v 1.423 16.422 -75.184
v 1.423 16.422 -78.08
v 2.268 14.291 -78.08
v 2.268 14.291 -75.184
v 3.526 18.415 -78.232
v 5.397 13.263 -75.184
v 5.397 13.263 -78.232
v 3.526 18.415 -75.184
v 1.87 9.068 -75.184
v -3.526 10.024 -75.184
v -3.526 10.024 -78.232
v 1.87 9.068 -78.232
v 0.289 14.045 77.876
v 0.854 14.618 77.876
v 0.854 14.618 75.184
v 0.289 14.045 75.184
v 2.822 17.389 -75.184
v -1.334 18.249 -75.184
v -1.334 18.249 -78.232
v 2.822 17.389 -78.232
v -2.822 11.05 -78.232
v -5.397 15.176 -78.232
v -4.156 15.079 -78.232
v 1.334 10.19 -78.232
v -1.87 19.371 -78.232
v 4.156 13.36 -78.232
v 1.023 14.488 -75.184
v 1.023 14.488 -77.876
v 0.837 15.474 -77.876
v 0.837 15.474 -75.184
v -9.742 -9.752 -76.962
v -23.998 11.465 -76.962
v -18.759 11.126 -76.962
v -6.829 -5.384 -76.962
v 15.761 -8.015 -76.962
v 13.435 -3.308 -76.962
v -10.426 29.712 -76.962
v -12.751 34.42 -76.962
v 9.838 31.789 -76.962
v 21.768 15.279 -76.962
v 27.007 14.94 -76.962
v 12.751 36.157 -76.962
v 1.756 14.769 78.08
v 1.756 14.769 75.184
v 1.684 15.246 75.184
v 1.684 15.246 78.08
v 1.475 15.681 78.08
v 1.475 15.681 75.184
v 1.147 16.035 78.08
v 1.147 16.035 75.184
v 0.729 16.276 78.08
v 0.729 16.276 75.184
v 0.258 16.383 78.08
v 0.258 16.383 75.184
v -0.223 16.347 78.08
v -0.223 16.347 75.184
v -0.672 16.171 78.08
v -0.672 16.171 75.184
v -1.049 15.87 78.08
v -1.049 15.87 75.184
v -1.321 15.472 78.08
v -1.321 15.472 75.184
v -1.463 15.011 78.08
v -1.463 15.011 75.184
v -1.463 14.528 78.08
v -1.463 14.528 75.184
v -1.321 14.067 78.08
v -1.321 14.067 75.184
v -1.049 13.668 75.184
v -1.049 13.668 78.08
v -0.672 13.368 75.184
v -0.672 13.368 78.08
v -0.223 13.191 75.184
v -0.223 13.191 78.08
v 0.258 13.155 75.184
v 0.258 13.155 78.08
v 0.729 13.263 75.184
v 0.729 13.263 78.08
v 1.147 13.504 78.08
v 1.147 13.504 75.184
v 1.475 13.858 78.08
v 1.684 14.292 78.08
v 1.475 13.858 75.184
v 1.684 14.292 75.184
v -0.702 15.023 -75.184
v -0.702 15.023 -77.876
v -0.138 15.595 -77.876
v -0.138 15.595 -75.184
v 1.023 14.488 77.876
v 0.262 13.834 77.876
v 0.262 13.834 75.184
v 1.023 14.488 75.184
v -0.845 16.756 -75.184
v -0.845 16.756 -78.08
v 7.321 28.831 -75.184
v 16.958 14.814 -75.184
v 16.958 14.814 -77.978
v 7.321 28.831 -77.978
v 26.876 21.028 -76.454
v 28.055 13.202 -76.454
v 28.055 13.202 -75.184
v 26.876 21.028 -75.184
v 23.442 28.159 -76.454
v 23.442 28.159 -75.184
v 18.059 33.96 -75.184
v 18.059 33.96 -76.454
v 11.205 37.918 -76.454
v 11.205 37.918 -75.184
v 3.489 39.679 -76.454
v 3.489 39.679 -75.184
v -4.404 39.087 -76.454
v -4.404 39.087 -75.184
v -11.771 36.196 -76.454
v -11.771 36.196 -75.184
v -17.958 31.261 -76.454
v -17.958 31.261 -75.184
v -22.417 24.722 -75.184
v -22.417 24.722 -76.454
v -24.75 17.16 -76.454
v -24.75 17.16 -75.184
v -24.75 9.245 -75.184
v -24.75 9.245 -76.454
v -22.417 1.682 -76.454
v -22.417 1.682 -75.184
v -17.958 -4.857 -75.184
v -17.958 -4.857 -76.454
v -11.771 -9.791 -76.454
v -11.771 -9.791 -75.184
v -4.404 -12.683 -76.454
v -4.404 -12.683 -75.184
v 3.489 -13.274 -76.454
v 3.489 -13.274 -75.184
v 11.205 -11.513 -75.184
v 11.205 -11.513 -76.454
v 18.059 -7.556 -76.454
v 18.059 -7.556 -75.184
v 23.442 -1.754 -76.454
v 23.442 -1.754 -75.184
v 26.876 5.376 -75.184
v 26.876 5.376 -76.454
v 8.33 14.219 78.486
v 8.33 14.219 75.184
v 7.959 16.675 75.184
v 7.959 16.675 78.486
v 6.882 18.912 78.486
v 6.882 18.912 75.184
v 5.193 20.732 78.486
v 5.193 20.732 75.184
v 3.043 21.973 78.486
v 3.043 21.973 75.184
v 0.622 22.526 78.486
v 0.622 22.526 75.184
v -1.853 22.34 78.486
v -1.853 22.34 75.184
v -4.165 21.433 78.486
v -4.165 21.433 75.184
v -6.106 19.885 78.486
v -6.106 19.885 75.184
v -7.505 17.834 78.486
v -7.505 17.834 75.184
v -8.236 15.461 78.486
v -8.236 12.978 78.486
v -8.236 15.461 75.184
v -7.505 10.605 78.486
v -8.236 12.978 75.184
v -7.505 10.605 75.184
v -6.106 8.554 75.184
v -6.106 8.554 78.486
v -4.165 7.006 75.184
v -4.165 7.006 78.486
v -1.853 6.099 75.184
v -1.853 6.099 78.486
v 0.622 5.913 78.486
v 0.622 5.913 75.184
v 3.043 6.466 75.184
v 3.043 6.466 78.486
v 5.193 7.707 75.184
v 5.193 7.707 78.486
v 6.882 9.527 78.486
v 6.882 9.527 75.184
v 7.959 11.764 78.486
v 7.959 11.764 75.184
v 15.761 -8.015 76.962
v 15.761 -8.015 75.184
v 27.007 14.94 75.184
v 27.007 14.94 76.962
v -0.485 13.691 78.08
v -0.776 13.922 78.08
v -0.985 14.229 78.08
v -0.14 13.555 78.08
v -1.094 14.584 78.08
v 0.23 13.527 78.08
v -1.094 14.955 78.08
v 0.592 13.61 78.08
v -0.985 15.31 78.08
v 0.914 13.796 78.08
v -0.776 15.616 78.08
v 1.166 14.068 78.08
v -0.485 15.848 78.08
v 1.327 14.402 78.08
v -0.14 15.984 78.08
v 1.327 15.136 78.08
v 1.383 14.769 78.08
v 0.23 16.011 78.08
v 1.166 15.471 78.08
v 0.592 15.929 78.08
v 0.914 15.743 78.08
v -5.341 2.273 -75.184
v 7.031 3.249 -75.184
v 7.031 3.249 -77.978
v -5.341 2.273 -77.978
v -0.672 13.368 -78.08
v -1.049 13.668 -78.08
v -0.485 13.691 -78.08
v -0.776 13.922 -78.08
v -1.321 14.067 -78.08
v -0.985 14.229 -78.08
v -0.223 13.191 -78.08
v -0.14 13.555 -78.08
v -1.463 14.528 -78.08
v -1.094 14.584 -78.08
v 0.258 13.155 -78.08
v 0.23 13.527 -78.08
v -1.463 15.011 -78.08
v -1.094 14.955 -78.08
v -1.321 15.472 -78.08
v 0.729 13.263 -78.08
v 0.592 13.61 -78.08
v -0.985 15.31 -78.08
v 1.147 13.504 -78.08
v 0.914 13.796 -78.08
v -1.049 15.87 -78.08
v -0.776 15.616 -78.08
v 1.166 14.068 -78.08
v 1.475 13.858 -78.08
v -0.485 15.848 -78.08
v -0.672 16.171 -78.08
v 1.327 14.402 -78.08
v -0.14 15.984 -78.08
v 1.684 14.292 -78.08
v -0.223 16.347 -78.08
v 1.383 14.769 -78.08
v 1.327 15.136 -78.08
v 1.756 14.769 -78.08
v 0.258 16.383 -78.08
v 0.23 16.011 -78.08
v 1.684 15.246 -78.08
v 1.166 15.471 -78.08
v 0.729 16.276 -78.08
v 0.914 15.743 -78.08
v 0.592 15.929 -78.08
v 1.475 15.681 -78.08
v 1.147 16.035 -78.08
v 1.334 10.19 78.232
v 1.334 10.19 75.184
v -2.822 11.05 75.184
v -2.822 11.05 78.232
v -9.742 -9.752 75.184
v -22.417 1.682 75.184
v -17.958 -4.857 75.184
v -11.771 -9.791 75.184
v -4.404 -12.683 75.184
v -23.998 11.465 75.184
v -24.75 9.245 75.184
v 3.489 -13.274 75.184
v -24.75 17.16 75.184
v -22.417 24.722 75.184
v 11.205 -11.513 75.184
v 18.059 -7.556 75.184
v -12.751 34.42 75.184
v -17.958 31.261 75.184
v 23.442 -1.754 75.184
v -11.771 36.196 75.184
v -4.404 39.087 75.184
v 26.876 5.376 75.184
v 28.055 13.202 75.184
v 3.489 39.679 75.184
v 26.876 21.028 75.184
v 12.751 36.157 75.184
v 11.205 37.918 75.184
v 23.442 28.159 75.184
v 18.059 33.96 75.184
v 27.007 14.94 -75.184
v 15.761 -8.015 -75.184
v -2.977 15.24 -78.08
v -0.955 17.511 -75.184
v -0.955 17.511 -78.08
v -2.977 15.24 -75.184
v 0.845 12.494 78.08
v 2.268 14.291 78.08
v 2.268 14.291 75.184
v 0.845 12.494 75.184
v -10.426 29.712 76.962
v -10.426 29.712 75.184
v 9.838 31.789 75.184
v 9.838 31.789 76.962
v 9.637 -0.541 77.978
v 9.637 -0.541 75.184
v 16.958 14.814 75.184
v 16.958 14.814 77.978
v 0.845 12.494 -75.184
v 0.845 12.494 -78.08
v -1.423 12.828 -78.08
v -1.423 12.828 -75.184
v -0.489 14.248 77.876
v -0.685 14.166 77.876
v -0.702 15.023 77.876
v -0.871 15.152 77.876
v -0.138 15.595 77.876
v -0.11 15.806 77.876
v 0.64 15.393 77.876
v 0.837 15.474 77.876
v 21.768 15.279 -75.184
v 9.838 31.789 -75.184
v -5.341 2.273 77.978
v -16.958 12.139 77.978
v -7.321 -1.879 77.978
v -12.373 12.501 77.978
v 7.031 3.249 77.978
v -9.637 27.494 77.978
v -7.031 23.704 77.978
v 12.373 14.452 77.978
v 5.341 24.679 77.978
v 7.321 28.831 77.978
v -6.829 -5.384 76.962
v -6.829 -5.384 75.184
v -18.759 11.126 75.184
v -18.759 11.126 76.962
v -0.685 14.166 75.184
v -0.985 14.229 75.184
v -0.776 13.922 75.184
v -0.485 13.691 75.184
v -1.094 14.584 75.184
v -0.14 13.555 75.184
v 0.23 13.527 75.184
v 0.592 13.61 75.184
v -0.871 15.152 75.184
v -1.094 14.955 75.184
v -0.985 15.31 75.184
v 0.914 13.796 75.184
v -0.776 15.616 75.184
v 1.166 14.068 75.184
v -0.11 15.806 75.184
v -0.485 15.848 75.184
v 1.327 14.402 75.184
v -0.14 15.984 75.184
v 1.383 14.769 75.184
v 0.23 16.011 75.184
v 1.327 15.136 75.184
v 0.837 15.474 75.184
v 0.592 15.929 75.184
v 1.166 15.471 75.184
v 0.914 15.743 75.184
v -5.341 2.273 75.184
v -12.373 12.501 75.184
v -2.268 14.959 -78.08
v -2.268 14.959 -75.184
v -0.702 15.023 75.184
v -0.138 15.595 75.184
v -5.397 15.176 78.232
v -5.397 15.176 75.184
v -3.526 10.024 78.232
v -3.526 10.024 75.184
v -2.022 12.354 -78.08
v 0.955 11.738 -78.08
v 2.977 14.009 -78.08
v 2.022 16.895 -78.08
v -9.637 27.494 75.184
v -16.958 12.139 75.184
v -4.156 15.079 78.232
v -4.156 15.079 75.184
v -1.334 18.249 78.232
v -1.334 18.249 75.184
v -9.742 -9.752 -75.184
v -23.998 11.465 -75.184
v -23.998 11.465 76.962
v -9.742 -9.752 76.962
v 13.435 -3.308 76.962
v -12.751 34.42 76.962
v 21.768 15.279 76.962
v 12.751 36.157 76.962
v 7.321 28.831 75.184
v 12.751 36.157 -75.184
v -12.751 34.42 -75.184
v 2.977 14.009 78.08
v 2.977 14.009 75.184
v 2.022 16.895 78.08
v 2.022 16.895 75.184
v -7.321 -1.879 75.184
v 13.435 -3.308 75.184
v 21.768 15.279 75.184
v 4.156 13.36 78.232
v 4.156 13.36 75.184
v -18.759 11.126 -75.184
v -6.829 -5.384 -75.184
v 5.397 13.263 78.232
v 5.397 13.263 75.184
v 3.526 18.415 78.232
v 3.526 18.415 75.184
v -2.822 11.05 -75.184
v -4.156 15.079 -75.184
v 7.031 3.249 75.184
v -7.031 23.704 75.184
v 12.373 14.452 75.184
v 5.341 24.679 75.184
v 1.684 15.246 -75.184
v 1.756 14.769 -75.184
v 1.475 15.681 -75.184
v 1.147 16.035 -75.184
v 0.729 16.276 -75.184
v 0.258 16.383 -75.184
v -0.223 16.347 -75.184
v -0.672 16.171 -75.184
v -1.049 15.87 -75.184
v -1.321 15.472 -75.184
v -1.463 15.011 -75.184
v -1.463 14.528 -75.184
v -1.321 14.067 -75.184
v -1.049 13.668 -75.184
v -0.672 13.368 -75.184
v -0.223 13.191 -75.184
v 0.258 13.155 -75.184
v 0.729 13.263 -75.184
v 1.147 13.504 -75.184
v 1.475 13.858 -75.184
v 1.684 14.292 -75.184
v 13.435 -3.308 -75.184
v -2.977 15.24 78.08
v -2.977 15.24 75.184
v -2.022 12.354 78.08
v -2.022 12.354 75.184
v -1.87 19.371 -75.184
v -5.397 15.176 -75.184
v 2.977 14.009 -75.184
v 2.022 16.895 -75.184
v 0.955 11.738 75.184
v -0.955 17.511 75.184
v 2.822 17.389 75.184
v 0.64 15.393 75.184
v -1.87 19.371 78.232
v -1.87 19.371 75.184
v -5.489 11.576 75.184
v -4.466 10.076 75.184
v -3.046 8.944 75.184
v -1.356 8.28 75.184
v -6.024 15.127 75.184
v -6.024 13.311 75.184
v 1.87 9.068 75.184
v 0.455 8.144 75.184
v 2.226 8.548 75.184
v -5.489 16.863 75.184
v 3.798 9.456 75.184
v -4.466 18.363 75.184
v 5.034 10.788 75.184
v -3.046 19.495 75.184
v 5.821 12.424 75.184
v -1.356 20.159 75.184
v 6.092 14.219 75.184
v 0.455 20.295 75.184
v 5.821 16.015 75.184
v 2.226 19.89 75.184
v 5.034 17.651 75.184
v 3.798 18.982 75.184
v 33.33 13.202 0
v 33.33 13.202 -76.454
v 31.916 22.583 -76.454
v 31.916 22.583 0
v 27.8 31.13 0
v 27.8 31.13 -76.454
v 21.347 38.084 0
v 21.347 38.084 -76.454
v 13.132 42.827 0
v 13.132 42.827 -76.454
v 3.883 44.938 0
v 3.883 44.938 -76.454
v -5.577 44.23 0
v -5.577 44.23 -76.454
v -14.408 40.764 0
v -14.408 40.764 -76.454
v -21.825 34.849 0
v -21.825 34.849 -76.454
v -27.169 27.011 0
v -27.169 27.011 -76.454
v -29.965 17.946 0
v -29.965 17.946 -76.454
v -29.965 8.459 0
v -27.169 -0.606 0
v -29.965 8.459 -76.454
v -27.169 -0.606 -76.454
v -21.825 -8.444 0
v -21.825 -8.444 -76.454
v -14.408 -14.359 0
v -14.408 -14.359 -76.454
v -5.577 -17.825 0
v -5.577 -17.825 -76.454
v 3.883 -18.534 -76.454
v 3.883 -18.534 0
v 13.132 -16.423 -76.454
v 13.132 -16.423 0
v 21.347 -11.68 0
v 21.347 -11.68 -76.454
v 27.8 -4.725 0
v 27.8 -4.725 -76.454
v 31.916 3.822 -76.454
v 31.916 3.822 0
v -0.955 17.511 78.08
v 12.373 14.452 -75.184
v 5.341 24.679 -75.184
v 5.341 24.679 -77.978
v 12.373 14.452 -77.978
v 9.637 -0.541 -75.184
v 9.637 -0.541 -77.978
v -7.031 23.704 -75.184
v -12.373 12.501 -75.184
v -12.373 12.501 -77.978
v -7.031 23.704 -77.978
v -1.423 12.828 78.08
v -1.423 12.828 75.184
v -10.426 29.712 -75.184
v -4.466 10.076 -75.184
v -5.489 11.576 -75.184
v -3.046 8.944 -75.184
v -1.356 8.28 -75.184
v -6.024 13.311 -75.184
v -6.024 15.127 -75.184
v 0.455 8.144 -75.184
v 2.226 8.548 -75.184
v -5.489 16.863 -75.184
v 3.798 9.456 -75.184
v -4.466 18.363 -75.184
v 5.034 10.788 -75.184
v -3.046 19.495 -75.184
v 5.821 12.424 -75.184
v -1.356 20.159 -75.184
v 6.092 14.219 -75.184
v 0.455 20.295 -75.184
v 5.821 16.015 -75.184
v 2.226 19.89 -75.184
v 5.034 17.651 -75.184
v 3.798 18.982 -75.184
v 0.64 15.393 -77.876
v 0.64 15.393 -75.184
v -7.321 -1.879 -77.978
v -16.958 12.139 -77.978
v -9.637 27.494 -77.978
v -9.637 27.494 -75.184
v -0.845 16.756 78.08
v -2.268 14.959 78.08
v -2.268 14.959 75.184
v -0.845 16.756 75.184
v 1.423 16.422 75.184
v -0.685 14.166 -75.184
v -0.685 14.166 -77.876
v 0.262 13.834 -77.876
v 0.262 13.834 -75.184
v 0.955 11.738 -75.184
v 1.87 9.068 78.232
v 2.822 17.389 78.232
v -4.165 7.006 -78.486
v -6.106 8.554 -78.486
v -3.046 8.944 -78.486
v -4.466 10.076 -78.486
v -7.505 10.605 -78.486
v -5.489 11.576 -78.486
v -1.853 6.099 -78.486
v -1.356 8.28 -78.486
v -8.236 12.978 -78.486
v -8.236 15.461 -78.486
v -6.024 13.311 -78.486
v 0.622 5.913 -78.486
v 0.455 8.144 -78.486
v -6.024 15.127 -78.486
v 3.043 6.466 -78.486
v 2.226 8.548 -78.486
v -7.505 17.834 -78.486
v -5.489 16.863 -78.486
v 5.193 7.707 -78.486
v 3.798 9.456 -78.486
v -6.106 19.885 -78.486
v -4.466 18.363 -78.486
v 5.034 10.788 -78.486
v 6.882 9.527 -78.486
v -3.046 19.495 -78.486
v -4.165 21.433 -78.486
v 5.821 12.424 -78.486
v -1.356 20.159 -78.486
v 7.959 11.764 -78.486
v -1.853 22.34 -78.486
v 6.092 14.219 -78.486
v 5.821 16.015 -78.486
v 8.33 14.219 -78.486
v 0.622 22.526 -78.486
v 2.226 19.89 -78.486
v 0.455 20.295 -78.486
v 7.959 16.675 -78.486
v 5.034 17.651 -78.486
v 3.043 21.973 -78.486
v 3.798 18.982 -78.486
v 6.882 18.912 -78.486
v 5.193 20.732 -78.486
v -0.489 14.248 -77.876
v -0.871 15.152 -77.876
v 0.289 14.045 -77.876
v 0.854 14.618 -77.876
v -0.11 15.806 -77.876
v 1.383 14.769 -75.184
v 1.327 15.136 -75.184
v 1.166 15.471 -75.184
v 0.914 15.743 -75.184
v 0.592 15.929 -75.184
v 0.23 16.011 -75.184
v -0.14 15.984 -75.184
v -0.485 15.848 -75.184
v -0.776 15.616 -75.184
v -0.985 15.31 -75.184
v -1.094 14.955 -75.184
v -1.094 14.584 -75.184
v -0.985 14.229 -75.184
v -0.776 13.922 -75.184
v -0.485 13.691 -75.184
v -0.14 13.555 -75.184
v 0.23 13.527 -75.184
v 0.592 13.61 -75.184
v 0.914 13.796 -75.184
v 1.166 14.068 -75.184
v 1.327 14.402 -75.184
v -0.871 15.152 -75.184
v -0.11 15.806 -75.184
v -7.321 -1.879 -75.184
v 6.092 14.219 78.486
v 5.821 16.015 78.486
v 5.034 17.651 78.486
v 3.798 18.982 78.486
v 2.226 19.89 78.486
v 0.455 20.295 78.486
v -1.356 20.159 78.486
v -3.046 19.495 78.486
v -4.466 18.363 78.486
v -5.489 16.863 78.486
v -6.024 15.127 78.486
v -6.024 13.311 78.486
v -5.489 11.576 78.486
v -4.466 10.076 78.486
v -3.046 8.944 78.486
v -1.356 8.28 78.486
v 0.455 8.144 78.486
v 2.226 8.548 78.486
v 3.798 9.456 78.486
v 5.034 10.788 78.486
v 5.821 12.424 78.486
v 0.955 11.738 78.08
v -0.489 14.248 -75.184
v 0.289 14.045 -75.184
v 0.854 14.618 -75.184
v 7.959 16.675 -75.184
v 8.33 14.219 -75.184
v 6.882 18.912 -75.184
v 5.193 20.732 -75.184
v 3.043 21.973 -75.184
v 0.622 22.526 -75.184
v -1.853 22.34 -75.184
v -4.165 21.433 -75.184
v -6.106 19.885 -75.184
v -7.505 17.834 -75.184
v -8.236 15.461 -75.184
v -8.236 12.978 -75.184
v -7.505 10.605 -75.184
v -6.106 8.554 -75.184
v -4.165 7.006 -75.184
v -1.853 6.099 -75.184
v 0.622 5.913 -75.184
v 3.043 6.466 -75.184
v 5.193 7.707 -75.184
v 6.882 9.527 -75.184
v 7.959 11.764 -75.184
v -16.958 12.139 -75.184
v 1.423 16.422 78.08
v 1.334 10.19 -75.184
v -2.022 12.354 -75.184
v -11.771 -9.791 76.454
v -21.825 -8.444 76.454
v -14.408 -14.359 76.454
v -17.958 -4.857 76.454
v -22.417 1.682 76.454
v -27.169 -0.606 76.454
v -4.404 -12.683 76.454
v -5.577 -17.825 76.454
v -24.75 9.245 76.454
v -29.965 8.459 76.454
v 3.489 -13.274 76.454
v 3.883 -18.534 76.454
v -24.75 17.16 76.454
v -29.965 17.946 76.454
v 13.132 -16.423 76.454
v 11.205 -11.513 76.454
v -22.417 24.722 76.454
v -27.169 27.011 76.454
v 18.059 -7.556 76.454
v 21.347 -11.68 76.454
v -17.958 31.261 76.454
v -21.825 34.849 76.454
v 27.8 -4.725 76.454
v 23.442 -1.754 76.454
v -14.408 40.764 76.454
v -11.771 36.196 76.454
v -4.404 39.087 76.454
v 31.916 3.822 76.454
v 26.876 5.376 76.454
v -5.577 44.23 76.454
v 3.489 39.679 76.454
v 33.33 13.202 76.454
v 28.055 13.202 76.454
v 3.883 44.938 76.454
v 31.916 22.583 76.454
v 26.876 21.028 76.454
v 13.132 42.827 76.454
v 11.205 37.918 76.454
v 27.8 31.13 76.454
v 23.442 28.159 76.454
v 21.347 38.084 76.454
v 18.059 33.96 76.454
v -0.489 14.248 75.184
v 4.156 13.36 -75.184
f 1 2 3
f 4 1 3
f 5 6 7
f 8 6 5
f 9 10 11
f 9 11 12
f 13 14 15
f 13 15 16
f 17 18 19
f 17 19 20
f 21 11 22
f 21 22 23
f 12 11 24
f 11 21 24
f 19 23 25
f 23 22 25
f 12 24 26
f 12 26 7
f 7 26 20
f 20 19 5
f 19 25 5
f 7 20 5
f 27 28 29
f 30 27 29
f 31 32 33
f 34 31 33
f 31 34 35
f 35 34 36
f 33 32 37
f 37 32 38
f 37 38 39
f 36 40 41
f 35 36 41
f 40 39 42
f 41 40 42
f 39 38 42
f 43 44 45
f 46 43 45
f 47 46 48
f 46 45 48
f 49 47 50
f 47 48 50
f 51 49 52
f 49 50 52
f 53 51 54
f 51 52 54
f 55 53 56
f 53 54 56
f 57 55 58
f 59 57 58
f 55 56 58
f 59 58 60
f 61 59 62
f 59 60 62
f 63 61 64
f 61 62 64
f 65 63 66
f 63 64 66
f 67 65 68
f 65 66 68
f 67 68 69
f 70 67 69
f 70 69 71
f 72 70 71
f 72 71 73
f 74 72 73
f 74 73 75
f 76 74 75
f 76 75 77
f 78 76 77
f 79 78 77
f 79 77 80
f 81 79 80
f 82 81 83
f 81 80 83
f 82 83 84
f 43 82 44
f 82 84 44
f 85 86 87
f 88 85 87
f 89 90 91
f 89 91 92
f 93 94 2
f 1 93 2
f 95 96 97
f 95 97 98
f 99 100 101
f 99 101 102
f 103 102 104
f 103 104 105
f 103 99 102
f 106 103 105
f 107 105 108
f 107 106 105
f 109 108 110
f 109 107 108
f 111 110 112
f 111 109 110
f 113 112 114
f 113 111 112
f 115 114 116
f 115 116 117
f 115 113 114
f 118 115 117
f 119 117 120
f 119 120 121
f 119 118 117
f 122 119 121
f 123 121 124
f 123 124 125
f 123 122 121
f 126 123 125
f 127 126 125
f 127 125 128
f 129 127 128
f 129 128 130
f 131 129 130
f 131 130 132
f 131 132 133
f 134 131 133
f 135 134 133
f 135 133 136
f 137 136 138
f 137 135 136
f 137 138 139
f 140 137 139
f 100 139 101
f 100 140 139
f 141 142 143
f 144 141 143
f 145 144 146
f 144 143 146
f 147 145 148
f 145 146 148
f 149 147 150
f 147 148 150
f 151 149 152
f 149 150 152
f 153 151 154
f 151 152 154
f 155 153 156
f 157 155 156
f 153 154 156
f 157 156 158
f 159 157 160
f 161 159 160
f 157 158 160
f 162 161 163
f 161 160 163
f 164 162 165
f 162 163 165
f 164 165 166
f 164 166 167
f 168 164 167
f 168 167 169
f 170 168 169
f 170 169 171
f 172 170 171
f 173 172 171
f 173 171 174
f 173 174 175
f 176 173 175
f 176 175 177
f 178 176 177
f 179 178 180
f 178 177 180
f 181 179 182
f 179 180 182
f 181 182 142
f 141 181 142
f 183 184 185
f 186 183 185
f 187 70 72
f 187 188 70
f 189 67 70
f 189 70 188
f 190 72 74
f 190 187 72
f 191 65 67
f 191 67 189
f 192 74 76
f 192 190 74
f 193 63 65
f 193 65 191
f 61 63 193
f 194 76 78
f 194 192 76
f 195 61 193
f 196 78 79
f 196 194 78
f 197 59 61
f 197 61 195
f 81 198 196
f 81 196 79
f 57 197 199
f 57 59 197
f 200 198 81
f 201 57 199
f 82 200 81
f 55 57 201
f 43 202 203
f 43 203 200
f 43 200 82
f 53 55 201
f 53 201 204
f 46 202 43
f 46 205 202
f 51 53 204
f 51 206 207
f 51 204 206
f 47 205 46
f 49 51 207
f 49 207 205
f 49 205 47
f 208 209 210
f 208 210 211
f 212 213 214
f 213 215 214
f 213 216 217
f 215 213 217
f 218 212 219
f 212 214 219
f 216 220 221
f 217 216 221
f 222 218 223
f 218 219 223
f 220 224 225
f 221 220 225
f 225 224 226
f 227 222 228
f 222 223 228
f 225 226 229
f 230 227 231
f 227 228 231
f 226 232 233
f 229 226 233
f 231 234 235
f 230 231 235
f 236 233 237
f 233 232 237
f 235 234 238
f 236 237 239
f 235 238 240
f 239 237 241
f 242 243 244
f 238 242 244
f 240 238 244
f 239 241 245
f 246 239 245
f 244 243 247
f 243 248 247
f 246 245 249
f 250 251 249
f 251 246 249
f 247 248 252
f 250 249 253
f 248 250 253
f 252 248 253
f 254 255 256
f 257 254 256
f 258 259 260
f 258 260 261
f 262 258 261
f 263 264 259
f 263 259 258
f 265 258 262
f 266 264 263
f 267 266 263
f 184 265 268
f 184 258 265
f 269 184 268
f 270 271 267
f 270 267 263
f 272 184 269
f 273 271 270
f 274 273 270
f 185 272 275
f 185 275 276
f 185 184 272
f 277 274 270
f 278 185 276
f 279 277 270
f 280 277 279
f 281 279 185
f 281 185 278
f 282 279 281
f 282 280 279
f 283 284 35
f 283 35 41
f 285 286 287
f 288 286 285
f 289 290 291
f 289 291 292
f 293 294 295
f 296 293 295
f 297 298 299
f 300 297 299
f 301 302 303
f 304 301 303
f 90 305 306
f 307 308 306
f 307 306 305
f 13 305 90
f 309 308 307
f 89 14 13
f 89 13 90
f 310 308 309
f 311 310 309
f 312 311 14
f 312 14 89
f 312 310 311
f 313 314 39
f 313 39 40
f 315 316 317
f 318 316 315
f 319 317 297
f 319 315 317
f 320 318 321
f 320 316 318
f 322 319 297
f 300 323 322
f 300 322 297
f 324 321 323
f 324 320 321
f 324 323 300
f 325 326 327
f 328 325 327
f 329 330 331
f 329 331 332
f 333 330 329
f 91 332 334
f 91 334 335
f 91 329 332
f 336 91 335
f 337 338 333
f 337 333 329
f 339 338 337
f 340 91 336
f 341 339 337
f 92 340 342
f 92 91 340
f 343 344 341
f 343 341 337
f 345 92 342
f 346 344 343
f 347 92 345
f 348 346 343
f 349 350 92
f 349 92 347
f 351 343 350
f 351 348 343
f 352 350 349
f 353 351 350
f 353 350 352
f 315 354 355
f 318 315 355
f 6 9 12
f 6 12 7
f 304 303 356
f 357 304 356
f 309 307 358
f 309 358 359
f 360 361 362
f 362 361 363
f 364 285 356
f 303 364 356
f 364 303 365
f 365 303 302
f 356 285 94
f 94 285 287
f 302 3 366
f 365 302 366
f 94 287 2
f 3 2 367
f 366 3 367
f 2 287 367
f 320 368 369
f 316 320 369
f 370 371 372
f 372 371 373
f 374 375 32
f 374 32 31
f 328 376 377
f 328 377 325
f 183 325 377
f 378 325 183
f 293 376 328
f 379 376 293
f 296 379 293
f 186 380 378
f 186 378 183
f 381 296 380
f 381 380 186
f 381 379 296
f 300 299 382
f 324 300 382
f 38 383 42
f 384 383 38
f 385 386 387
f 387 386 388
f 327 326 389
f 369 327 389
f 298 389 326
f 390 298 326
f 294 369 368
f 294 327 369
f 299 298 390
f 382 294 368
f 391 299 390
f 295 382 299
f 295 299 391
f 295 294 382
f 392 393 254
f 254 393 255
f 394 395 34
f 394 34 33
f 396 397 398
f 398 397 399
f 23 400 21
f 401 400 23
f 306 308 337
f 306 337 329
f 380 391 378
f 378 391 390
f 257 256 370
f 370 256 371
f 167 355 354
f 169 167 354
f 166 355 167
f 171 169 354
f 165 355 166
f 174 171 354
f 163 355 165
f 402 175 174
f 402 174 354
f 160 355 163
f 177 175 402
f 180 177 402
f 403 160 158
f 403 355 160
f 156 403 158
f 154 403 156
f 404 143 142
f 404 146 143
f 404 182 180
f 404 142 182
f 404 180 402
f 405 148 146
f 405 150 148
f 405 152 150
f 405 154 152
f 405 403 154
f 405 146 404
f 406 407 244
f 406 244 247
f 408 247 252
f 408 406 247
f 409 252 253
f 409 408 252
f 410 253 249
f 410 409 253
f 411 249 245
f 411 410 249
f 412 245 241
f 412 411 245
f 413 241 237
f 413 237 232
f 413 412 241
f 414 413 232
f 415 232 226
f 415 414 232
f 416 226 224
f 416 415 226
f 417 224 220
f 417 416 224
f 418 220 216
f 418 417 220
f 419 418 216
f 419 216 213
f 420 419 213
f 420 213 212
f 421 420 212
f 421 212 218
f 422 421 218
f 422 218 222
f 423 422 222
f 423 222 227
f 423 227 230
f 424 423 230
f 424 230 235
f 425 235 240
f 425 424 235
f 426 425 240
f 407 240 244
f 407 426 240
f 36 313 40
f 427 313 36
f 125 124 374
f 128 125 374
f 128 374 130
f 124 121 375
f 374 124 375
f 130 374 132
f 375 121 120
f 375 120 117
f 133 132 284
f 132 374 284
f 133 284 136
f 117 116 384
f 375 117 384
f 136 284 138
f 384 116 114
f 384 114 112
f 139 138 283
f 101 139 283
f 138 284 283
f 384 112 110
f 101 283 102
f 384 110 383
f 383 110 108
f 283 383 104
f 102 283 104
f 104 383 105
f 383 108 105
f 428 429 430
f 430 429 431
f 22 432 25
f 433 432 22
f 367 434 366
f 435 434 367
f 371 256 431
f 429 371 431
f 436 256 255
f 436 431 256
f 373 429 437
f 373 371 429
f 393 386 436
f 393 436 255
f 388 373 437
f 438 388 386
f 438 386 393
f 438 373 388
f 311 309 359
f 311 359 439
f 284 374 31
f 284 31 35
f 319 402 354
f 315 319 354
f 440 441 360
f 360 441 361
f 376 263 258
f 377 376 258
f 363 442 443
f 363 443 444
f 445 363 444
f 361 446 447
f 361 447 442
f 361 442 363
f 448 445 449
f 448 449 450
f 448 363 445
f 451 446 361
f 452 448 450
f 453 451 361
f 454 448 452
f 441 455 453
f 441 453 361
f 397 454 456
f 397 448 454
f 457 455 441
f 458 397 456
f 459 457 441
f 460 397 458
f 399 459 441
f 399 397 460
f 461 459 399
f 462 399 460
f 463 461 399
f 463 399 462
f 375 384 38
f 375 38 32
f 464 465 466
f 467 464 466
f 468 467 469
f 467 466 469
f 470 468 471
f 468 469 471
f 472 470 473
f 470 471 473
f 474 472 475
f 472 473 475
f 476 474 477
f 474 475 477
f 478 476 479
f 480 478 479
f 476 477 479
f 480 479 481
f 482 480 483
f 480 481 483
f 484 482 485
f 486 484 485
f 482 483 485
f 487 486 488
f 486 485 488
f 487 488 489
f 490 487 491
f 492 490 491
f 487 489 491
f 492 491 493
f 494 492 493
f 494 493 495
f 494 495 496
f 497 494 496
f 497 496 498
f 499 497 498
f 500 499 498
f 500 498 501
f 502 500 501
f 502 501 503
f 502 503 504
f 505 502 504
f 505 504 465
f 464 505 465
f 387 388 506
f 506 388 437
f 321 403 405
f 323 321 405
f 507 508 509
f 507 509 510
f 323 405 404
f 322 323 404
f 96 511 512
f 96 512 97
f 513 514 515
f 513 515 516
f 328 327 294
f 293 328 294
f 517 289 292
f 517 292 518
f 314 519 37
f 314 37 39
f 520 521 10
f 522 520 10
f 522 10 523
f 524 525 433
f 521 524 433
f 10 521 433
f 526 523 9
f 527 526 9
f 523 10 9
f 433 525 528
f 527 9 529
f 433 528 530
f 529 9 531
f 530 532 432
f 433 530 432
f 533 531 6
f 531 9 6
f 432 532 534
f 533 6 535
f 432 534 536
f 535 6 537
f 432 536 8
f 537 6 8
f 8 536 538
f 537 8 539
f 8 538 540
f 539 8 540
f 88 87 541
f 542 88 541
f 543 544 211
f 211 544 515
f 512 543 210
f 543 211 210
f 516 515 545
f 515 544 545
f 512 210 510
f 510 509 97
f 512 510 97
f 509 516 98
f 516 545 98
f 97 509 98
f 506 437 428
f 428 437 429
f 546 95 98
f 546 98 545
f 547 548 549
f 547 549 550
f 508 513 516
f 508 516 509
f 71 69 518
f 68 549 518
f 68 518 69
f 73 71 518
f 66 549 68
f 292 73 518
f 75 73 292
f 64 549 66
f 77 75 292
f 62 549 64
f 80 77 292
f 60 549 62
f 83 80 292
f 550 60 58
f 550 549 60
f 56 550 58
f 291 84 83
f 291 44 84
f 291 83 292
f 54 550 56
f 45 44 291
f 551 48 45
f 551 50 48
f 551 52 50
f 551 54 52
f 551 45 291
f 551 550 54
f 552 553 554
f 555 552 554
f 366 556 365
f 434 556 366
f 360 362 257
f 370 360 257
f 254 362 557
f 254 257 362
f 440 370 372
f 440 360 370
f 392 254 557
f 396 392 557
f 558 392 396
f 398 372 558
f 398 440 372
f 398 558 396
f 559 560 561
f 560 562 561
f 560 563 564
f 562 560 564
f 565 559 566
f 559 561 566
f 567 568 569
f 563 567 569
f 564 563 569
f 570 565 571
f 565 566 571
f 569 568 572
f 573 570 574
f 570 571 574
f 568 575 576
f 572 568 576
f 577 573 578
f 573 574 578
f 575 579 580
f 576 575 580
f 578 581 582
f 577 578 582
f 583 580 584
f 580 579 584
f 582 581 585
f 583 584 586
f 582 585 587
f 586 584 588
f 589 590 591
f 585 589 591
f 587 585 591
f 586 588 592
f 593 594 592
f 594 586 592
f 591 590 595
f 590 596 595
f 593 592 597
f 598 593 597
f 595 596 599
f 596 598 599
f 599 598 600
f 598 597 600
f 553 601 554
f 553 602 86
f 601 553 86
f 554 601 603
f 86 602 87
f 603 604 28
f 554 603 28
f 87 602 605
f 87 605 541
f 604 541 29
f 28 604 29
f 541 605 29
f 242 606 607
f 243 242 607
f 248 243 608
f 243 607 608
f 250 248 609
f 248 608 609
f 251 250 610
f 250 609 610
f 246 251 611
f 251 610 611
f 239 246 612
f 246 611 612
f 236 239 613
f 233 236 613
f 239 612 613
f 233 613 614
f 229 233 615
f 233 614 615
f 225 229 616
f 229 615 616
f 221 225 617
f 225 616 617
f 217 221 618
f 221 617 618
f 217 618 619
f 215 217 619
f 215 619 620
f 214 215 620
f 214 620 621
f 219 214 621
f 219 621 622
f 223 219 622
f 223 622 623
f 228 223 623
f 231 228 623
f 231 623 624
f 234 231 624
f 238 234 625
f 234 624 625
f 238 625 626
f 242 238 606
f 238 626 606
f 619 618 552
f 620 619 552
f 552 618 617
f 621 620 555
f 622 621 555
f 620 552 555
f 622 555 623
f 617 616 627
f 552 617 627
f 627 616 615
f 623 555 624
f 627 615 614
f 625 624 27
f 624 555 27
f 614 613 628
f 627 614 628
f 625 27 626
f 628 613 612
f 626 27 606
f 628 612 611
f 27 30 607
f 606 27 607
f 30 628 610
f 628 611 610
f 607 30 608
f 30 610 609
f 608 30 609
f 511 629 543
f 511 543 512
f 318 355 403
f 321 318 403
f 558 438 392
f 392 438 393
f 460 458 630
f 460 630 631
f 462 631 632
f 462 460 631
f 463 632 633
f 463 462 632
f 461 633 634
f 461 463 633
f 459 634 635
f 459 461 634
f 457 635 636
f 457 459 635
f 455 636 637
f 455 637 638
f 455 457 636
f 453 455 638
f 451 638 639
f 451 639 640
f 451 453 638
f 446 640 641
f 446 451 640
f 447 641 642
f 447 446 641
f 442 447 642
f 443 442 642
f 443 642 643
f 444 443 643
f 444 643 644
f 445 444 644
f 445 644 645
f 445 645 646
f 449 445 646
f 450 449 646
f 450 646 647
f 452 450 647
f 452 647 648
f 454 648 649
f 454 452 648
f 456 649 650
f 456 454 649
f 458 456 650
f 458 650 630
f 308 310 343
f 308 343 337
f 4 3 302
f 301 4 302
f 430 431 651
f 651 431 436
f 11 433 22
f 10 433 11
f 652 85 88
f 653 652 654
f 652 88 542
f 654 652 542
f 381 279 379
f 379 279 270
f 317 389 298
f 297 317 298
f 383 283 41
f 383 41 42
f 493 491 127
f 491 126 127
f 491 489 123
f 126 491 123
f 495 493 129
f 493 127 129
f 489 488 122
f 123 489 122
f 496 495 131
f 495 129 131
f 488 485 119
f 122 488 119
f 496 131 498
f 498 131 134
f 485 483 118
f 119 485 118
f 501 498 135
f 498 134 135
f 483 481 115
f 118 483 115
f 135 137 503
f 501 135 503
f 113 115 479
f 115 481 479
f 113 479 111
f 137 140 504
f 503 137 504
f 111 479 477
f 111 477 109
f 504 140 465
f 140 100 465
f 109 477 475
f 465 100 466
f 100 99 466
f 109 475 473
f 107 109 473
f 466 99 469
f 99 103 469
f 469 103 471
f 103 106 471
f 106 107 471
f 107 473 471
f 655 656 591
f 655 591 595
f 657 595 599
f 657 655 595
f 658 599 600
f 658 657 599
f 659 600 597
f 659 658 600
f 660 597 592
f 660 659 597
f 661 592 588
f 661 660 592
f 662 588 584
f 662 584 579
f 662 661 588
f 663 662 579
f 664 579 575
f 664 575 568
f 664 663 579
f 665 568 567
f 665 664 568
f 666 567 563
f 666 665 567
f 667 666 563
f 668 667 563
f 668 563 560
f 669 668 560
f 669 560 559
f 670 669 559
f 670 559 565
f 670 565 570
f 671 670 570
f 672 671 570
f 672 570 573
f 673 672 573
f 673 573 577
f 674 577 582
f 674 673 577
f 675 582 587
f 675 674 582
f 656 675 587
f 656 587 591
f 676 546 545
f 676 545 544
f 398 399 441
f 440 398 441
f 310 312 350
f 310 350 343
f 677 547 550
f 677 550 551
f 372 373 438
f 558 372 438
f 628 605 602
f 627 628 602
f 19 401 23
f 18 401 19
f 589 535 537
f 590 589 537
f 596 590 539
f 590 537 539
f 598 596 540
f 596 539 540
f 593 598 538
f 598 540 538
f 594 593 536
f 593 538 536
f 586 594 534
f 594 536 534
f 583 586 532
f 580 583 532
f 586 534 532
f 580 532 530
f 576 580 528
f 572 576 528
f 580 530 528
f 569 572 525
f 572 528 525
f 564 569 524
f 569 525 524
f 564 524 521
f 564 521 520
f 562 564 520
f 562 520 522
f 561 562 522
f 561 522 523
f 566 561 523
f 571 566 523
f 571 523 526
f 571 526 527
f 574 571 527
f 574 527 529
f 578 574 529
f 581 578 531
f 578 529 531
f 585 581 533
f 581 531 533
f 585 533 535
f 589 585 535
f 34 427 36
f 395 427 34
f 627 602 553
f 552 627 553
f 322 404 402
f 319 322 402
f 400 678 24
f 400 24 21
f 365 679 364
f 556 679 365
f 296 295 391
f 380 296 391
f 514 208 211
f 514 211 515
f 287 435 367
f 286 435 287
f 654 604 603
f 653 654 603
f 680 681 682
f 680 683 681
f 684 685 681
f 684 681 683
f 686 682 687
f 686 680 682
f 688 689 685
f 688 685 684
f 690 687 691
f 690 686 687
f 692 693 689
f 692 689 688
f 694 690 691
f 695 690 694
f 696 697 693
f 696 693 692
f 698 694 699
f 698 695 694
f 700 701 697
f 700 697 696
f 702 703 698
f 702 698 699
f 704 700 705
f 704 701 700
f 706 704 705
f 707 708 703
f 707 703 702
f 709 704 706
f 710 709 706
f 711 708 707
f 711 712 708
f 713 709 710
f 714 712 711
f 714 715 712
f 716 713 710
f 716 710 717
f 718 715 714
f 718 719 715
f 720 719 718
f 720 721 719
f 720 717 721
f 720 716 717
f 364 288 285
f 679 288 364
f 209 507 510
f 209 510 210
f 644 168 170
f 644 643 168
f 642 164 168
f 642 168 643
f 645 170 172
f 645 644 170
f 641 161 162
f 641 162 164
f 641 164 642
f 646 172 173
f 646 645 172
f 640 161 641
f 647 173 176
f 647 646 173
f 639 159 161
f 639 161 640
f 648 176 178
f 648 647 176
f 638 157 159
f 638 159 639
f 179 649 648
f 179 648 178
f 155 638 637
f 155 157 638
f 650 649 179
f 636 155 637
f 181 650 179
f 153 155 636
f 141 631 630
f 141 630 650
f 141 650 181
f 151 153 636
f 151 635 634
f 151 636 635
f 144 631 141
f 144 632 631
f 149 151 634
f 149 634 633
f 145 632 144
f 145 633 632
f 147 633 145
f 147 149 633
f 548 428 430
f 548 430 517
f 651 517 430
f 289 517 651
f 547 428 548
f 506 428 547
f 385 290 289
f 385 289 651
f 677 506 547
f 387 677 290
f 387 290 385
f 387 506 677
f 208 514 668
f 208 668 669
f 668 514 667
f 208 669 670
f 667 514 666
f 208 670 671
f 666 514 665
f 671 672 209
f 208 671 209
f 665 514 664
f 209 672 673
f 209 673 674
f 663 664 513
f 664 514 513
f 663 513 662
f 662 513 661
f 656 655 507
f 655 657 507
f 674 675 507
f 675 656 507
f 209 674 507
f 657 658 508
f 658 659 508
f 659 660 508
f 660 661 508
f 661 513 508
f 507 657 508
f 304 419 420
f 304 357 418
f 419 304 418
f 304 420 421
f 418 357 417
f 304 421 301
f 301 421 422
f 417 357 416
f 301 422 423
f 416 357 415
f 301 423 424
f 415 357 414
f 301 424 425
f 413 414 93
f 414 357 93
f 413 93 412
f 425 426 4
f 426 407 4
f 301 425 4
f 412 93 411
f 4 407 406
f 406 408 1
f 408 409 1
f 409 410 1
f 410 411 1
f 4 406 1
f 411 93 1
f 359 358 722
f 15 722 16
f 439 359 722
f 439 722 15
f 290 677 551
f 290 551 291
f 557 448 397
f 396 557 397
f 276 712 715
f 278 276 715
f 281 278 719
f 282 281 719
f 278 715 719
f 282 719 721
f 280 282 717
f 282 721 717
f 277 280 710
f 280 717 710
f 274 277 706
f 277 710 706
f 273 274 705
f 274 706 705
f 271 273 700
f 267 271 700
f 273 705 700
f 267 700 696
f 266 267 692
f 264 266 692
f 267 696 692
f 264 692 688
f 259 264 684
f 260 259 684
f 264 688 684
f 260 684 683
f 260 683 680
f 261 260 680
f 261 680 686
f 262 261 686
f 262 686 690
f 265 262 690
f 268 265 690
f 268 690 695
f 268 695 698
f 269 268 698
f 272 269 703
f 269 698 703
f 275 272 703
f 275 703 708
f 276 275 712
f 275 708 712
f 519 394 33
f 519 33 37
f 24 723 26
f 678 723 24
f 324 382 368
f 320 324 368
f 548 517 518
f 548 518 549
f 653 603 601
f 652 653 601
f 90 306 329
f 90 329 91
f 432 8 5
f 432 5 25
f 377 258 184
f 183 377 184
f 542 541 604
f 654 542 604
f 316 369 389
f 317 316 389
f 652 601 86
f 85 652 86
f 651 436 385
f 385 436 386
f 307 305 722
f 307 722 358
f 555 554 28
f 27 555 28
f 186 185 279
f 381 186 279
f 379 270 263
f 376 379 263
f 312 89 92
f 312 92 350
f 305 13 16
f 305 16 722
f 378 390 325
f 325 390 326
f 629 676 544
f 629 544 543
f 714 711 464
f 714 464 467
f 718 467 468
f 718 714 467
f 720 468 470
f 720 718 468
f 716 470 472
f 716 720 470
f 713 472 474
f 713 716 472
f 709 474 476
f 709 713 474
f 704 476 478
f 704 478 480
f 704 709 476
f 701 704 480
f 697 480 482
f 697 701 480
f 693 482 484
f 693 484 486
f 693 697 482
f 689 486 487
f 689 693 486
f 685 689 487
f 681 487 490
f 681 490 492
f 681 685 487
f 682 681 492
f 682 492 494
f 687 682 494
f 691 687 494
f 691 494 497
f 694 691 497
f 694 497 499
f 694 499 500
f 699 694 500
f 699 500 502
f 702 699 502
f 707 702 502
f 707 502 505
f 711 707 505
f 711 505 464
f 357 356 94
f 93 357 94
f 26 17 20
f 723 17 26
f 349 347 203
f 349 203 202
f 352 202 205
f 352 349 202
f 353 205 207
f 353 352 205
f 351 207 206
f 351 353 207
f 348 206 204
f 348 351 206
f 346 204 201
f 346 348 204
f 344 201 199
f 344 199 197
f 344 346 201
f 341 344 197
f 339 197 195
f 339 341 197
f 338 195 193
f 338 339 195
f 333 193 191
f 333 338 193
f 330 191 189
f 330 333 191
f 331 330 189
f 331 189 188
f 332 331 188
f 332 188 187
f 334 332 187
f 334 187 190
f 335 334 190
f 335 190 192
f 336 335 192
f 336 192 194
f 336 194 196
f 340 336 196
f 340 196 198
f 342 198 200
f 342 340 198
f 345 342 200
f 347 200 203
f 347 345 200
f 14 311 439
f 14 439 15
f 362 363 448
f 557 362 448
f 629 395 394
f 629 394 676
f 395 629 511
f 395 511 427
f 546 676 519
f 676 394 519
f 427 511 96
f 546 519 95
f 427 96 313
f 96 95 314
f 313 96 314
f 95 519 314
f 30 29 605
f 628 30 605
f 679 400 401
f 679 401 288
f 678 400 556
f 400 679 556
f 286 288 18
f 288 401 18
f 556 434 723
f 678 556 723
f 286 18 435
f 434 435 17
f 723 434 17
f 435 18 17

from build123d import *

# Parameters (mm, degrees)
F0_W      = 113.012448
F0_H      = 123.940129
F1_DEPTH  = 76.454
F3_DEPTH  = 101.092
F5_DEPTH  = 99.568
F7_DEPTH  = 103.378
F8_W      = 11.922672
F8_H      = 25.046903
F8_W_2    = 12.908016
F9_DEPTH  = 2.286
F10_R     = 0.621429
F11_DEPTH = 0.6858
F12_R     = 26.550664
F13_DEPTH = 1.27
F15_DEPTH = 1.778
F17_DEPTH = 2.794
F18_R     = 8.329505
F18_R_2   = 6.092118
F19_DEPTH = 3.302
F21_DEPTH = 3.556
F23_DEPTH = 3.048
F25_DEPTH = 2.8956
F26_R     = 1.618614
F26_R_2   = 1.245405
F27_DEPTH = 2.8956
F29_DEPTH = 2.6924
F30_R     = 98.414689
F30_R_2   = 31.825087
F31_DEPTH = 92.964


with BuildPart() as f1:
    # F0 (on Top) → F1 (new body)
    with BuildSketch(Plane.XY):
        with Locations((4.576676, -1.209681)):
            Rectangle(F0_W, F0_H)
    extrude(amount=F1_DEPTH)

    # F2 (on face) → F3 (cut)
    with BuildSketch(Plane.XY.offset(76.454)):
        Polygon((-51.929548, 60.760383), (-51.929548, 0), (-14.090432, 60.760383), align=None)
    extrude(amount=-F3_DEPTH, mode=Mode.SUBTRACT)

    # F4 (on face) → F5 (cut)
    with BuildSketch(Plane.XY.offset(76.454)):
        Polygon((13.499225, 60.760383), (61.0829, 0), (61.0829, 60.760383), align=None)
    extrude(amount=-F5_DEPTH, mode=Mode.SUBTRACT)

    # F6 (on face) → F7 (cut)
    with BuildSketch(Plane.XY.offset(76.454)):
        Polygon((-14.090432, 60.760383), (-51.929548, 0), (-0.295603, 60.760383), align=None)
        Polygon((13.499225, 60.760383), (-0.295603, 60.760383), (61.0829, 0), align=None)
    extrude(amount=-F7_DEPTH, mode=Mode.SUBTRACT)

    # F8 (on face) → F9 (cut)
    with BuildSketch(Plane.XY.offset(76.454)):
        with Locations((-5.961336, -50.656295)):
            Rectangle(F8_W, F8_H)
        with Locations((6.454008, -50.656295)):
            Rectangle(F8_W_2, F8_H)
    extrude(amount=-F9_DEPTH, mode=Mode.SUBTRACT)

    # F10 (on face) → F11 (join)
    with BuildSketch(Plane.XY.offset(74.168)):
        with Locations((-1.345813, -50.279461)):
            Circle(F10_R)
        with Locations((1.885621, -50.238032)):
            Circle(F10_R)
    extrude(amount=F11_DEPTH)

    # F12 (on face) → F13 (cut)
    with BuildSketch(Plane.XY.offset(76.454)):
        with Locations((1.504538, 13.202349)):
            Circle(F12_R)
    extrude(amount=-F13_DEPTH, mode=Mode.SUBTRACT)

    # F14 (on face) → F15 (join)
    with BuildSketch(Plane.XY.offset(75.184)):
        Polygon((12.751438, 36.157132), (-12.751438, 34.419841), (-23.998337, 11.465057), (-9.742361, -9.752435), (15.760514, -8.015144), (27.007414, 14.93964), align=None)
        Polygon((-6.828518, -5.384374), (-18.758564, 11.125626), (-10.425508, 29.712349), (9.837595, 31.789072), (21.767641, 15.279072), (13.434584, -3.307651), align=None, mode=Mode.SUBTRACT)
    extrude(amount=F15_DEPTH)

    # F16 (on face) → F17 (join)
    with BuildSketch(Plane.XY.offset(75.184)):
        Polygon((-16.9584, 12.139062), (-7.321048, -1.878684), (9.637352, -0.541365), (16.9584, 14.8137), (7.321048, 28.831446), (-9.637352, 27.494127), align=None)
        Polygon((7.031429, 3.249008), (-5.34145, 2.273298), (-12.372879, 12.500671), (-7.031429, 23.703754), (5.34145, 24.679464), (12.372879, 14.452091), align=None, mode=Mode.SUBTRACT)
    extrude(amount=F17_DEPTH)

    # F18 (on face) → F19 (join)
    with BuildSketch(Plane.XY.offset(75.184)):
        with Locations((0, 14.219483)):
            Circle(F18_R)
        with Locations((0, 14.219483)):
            Circle(F18_R_2, mode=Mode.SUBTRACT)
    extrude(amount=F19_DEPTH)

    # F20 (on face) → F21 (join)
    with BuildSketch(Plane.XY.offset(75.184)):
        Polygon((-2.917235, 18.868994), (-5.485212, 14.017839), (-2.567977, 9.368329), (2.917235, 9.569973), (5.485212, 14.421128), (2.567977, 19.070638), align=None)
        Polygon((-2.18643, 10.301922), (-4.485922, 14.154206), (-2.299493, 18.071767), (2.18643, 18.137044), (4.485922, 14.28476), (2.299493, 10.367199), align=None, mode=Mode.SUBTRACT)
    extrude(amount=-F21_DEPTH)

    # F22 (on face) → F23 (join)
    with BuildSketch(Plane.XY.offset(75.184)):
        Polygon((-1.87018, 19.37121), (-5.396616, 15.175724), (-3.526437, 10.023997), (1.87018, 9.067756), (5.396616, 13.263243), (3.526437, 18.41497), align=None)
        Polygon((-2.822472, 11.049773), (-4.156286, 15.078961), (-1.333814, 18.248671), (2.822472, 17.389194), (4.156286, 13.360006), (1.333814, 10.190296), align=None, mode=Mode.SUBTRACT)
    extrude(amount=F23_DEPTH)

    # F24 (on face) → F25 (join)
    with BuildSketch(Plane.XY.offset(75.184)):
        Polygon((-0.955476, 17.510887), (-2.977351, 15.240268), (-2.021875, 12.353964), (0.955476, 11.738278), (2.977351, 14.008897), (2.021875, 16.895202), align=None)
        Polygon((-1.423189, 12.827654), (-2.267781, 14.958636), (-0.844592, 16.755565), (1.423189, 16.421512), (2.267781, 14.290529), (0.844592, 12.4936), align=None, mode=Mode.SUBTRACT)
    extrude(amount=F25_DEPTH)

    # F26 (on face) → F27 (join)
    with BuildSketch(Plane.XY.offset(75.184)):
        with Locations((0.137317, 14.769351)):
            Circle(F26_R)
        with Locations((0.137317, 14.769351)):
            Circle(F26_R_2, mode=Mode.SUBTRACT)
    extrude(amount=F27_DEPTH)

    # F28 (on face) → F29 (join)
    with BuildSketch(Plane.XY.offset(75.184)):
        Polygon((-0.110171, 15.806148), (-0.871044, 15.152074), (-0.685036, 14.166102), (0.261845, 13.834204), (1.022717, 14.488278), (0.836709, 15.47425), align=None)
        Polygon((-0.488767, 14.24752), (-0.7024, 15.022809), (-0.137796, 15.595465), (0.64044, 15.392832), (0.854073, 14.617543), (0.28947, 14.044887), align=None, mode=Mode.SUBTRACT)
    extrude(amount=F29_DEPTH)

    # F30 (on face) → F31 (cut)
    with BuildSketch(Plane.XY.offset(76.454)):
        with Locations((1.504538, 13.202349)):
            Circle(F30_R)
        with Locations((1.504538, 13.202349)):
            Circle(F30_R_2, mode=Mode.SUBTRACT)
    extrude(amount=-F31_DEPTH, mode=Mode.SUBTRACT)

    # F32: F1 across plane


with BuildPart() as f1_1:
    add(f1.part)
    add(f1.part.mirror(Plane.XY))


solid = f1_1.part
